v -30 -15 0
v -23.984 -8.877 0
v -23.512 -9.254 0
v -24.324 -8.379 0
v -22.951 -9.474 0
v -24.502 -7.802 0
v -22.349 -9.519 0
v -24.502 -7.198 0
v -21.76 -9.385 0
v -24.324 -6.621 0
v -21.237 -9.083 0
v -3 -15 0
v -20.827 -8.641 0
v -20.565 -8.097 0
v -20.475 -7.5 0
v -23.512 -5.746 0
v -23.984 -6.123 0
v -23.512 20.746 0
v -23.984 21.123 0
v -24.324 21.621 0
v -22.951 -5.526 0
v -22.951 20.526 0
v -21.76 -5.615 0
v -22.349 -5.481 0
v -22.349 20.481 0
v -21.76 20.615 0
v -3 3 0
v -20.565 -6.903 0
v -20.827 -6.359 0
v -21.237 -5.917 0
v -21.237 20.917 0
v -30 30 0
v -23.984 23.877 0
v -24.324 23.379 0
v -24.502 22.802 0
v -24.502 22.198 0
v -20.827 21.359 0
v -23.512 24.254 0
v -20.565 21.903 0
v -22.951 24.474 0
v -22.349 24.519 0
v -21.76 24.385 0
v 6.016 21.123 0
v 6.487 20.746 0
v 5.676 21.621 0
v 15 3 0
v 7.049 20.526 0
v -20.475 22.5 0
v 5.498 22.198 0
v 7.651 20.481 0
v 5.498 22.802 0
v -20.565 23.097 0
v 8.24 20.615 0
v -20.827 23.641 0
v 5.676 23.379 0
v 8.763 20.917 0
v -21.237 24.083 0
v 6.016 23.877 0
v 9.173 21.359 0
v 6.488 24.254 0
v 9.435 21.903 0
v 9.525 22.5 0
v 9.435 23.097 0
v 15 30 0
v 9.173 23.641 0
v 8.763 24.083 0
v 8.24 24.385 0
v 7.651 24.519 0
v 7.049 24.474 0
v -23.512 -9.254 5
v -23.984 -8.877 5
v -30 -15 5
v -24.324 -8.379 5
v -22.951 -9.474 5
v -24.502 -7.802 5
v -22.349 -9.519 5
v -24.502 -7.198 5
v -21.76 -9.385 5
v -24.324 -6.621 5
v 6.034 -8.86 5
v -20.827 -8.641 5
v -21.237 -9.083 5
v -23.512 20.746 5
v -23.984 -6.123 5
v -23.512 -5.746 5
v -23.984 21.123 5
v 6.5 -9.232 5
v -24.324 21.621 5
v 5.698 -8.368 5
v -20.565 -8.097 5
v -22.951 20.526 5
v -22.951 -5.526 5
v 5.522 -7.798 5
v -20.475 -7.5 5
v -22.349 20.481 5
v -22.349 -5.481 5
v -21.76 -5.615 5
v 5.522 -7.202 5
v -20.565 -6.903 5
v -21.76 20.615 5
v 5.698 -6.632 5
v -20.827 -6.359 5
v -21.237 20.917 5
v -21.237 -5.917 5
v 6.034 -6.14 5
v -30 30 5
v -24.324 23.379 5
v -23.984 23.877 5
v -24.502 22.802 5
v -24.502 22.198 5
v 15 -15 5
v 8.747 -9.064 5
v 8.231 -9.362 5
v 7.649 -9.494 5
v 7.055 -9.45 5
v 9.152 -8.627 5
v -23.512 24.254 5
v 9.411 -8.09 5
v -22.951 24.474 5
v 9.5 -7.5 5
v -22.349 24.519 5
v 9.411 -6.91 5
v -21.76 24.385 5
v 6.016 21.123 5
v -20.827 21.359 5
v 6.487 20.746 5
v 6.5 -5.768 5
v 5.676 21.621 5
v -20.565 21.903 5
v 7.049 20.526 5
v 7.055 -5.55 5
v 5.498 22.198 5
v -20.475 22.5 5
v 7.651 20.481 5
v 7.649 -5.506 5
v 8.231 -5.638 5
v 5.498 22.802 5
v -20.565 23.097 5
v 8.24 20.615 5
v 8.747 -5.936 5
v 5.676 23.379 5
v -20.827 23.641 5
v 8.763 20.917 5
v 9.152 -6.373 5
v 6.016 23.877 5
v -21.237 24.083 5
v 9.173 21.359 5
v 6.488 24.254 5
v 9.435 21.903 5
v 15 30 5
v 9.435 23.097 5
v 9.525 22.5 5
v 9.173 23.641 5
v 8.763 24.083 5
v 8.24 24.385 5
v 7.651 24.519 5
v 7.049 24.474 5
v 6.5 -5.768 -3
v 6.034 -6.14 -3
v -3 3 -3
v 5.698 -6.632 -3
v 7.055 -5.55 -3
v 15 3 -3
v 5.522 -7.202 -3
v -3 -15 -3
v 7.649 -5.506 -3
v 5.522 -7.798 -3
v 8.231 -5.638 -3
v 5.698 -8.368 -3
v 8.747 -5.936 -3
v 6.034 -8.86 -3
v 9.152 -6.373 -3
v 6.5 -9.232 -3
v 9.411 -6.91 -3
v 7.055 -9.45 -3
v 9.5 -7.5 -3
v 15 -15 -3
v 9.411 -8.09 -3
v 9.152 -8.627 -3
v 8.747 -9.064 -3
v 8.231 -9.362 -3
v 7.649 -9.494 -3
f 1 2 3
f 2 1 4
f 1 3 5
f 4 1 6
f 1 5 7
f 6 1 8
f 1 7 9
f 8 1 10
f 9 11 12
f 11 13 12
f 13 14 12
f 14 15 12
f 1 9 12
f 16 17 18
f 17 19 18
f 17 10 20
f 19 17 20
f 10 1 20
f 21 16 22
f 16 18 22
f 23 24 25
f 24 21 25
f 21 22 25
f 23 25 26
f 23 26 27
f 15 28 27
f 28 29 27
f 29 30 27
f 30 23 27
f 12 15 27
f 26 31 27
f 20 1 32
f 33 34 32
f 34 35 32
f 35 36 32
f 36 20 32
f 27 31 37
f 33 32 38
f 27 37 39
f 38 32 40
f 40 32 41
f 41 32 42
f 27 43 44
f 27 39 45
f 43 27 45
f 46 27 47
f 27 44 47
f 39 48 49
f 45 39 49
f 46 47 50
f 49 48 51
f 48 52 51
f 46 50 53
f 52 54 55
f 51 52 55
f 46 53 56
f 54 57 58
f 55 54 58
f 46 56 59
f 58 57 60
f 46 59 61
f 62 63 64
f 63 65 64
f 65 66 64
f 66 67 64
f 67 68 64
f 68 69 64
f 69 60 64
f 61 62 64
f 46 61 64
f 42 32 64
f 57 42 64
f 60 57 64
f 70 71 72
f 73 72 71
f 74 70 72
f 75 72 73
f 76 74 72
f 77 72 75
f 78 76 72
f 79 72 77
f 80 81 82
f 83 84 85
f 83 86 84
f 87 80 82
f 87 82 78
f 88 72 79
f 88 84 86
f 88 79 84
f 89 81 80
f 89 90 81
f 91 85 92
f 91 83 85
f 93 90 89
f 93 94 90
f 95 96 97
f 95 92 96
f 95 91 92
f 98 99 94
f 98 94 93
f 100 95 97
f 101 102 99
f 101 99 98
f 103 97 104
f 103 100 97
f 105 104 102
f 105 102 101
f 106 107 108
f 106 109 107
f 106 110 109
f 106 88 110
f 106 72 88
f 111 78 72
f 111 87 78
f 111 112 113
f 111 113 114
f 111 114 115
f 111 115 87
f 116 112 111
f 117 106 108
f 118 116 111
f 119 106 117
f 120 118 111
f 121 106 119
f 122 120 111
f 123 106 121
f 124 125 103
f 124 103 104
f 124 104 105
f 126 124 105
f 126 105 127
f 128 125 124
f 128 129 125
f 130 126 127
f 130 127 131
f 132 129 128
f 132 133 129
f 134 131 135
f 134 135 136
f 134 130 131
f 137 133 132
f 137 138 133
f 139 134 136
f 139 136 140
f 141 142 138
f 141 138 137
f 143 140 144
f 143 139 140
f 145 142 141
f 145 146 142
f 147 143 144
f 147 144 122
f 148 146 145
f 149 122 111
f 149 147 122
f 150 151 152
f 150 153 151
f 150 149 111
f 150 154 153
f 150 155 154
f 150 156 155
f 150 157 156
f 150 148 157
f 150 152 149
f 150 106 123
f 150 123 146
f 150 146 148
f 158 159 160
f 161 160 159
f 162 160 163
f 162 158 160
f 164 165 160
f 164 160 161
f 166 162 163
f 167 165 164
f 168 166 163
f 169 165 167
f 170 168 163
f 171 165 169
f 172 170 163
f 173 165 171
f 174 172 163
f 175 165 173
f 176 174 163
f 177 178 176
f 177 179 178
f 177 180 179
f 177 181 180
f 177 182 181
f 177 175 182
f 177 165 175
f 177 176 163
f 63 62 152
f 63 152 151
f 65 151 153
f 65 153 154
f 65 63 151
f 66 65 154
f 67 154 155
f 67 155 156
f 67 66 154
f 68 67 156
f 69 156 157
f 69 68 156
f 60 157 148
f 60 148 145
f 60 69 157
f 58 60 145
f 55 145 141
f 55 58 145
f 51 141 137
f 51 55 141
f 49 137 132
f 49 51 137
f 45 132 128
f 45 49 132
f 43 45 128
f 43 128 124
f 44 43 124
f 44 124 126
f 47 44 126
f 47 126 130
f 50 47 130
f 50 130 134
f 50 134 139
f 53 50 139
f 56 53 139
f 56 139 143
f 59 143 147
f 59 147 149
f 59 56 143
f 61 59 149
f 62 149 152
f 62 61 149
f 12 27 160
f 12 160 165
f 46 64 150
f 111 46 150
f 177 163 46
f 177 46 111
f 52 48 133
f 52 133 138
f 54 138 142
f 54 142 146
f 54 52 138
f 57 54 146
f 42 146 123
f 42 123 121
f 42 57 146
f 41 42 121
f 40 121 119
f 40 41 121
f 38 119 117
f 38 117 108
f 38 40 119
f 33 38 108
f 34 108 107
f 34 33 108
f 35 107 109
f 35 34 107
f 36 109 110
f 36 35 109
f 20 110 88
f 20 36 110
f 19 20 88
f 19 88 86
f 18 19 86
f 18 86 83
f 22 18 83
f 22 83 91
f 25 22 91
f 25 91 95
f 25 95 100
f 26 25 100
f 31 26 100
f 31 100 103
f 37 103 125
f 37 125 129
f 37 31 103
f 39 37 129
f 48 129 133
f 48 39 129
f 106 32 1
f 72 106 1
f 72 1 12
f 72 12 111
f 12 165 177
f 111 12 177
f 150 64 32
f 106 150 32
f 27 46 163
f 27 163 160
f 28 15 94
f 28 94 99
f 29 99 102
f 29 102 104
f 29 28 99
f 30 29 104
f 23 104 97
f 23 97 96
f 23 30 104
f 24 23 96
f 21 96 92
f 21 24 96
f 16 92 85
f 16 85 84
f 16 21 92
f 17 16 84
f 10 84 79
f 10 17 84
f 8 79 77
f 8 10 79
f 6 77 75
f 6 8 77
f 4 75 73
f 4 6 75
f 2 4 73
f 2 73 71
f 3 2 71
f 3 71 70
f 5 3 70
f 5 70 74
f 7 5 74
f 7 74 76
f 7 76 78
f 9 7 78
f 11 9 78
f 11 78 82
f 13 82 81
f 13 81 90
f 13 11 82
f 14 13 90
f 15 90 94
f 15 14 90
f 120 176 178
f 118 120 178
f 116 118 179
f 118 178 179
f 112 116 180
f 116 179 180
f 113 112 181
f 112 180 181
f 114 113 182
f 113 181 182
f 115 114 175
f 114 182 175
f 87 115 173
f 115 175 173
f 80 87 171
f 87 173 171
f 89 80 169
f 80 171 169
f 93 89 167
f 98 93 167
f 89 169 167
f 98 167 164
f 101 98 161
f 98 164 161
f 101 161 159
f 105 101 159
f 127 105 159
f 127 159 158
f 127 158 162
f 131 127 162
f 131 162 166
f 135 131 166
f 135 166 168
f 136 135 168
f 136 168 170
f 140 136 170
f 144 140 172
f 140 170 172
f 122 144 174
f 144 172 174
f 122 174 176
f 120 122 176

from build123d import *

# Parameters (mm, degrees)
F0_W     = 12
F0_H     = 15
F0_W_2   = 3
F1_DEPTH = 5
F2_DEPTH = 3
F3_W     = 15
F3_H     = 15
F3_R     = 2
F4_DEPTH = 8
F0_W_3   = 15
F0_R     = 2.025
F5_DEPTH = 5


# Not quite as in the source:
# - a feature names something its author has since deleted; it is built from what else it names


with BuildPart() as f1:
    # F0 (on Top) → F1 (new body)
    with BuildSketch(Plane.XY):
        with Locations((-9, -7.5)):
            Rectangle(F0_W, F0_H)
        with Locations((-1.5, -7.5)):
            Rectangle(F0_W_2, F0_H)
        Polygon((-3, 3), (-3, 0), (0, 0), (15, 0), (15, 3), align=None)
    extrude(amount=F1_DEPTH)

    # F0 (on Top) → F2 (join)
    with BuildSketch(Plane.XY):
        with Locations((-1.5, -7.5)):
            Rectangle(F0_W_2, F0_H)
        Polygon((-3, 3), (-3, 0), (0, 0), (15, 0), (15, 3), align=None)
    extrude(amount=-F2_DEPTH)

    # F3 (on face) → F4 (join)
    with BuildSketch(Plane(origin=(0, 0, -3), x_dir=(1, 0, 0), z_dir=(0, 0, -1))):
        with Locations((7.5, 7.5)):
            Rectangle(F3_W, F3_H)
        with Locations((7.5, 7.5)):
            Circle(F3_R, mode=Mode.SUBTRACT)
    extrude(amount=-F4_DEPTH)

    # F0 (on Top) → F5 (join)
    with BuildSketch(Plane.XY):
        with Locations((-22.5, -7.5)):
            Rectangle(F0_W_3, F0_H)
        with Locations((-22.5, -7.5)):
            Circle(F0_R, mode=Mode.SUBTRACT)
        with Locations((-22.5, 7.5)):
            Rectangle(F0_W_3, F0_H)
        Polygon((0, 15), (-15, 15), (-15, 0), (-3, 0), (-3, 3), (15, 3), (15, 15), align=None)
        with Locations((-7.5, 22.5)):
            Rectangle(F0_W_3, F0_H)
        with Locations((7.5, 22.5)):
            Rectangle(F0_W_3, F0_H)
        with Locations((7.5, 22.5)):
            Circle(F0_R, mode=Mode.SUBTRACT)
        with Locations((-22.5, 22.5)):
            Rectangle(F0_W_3, F0_H)
        with Locations((-22.5, 22.5)):
            Circle(F0_R, mode=Mode.SUBTRACT)
    extrude(amount=F5_DEPTH)


solid = f1.part
